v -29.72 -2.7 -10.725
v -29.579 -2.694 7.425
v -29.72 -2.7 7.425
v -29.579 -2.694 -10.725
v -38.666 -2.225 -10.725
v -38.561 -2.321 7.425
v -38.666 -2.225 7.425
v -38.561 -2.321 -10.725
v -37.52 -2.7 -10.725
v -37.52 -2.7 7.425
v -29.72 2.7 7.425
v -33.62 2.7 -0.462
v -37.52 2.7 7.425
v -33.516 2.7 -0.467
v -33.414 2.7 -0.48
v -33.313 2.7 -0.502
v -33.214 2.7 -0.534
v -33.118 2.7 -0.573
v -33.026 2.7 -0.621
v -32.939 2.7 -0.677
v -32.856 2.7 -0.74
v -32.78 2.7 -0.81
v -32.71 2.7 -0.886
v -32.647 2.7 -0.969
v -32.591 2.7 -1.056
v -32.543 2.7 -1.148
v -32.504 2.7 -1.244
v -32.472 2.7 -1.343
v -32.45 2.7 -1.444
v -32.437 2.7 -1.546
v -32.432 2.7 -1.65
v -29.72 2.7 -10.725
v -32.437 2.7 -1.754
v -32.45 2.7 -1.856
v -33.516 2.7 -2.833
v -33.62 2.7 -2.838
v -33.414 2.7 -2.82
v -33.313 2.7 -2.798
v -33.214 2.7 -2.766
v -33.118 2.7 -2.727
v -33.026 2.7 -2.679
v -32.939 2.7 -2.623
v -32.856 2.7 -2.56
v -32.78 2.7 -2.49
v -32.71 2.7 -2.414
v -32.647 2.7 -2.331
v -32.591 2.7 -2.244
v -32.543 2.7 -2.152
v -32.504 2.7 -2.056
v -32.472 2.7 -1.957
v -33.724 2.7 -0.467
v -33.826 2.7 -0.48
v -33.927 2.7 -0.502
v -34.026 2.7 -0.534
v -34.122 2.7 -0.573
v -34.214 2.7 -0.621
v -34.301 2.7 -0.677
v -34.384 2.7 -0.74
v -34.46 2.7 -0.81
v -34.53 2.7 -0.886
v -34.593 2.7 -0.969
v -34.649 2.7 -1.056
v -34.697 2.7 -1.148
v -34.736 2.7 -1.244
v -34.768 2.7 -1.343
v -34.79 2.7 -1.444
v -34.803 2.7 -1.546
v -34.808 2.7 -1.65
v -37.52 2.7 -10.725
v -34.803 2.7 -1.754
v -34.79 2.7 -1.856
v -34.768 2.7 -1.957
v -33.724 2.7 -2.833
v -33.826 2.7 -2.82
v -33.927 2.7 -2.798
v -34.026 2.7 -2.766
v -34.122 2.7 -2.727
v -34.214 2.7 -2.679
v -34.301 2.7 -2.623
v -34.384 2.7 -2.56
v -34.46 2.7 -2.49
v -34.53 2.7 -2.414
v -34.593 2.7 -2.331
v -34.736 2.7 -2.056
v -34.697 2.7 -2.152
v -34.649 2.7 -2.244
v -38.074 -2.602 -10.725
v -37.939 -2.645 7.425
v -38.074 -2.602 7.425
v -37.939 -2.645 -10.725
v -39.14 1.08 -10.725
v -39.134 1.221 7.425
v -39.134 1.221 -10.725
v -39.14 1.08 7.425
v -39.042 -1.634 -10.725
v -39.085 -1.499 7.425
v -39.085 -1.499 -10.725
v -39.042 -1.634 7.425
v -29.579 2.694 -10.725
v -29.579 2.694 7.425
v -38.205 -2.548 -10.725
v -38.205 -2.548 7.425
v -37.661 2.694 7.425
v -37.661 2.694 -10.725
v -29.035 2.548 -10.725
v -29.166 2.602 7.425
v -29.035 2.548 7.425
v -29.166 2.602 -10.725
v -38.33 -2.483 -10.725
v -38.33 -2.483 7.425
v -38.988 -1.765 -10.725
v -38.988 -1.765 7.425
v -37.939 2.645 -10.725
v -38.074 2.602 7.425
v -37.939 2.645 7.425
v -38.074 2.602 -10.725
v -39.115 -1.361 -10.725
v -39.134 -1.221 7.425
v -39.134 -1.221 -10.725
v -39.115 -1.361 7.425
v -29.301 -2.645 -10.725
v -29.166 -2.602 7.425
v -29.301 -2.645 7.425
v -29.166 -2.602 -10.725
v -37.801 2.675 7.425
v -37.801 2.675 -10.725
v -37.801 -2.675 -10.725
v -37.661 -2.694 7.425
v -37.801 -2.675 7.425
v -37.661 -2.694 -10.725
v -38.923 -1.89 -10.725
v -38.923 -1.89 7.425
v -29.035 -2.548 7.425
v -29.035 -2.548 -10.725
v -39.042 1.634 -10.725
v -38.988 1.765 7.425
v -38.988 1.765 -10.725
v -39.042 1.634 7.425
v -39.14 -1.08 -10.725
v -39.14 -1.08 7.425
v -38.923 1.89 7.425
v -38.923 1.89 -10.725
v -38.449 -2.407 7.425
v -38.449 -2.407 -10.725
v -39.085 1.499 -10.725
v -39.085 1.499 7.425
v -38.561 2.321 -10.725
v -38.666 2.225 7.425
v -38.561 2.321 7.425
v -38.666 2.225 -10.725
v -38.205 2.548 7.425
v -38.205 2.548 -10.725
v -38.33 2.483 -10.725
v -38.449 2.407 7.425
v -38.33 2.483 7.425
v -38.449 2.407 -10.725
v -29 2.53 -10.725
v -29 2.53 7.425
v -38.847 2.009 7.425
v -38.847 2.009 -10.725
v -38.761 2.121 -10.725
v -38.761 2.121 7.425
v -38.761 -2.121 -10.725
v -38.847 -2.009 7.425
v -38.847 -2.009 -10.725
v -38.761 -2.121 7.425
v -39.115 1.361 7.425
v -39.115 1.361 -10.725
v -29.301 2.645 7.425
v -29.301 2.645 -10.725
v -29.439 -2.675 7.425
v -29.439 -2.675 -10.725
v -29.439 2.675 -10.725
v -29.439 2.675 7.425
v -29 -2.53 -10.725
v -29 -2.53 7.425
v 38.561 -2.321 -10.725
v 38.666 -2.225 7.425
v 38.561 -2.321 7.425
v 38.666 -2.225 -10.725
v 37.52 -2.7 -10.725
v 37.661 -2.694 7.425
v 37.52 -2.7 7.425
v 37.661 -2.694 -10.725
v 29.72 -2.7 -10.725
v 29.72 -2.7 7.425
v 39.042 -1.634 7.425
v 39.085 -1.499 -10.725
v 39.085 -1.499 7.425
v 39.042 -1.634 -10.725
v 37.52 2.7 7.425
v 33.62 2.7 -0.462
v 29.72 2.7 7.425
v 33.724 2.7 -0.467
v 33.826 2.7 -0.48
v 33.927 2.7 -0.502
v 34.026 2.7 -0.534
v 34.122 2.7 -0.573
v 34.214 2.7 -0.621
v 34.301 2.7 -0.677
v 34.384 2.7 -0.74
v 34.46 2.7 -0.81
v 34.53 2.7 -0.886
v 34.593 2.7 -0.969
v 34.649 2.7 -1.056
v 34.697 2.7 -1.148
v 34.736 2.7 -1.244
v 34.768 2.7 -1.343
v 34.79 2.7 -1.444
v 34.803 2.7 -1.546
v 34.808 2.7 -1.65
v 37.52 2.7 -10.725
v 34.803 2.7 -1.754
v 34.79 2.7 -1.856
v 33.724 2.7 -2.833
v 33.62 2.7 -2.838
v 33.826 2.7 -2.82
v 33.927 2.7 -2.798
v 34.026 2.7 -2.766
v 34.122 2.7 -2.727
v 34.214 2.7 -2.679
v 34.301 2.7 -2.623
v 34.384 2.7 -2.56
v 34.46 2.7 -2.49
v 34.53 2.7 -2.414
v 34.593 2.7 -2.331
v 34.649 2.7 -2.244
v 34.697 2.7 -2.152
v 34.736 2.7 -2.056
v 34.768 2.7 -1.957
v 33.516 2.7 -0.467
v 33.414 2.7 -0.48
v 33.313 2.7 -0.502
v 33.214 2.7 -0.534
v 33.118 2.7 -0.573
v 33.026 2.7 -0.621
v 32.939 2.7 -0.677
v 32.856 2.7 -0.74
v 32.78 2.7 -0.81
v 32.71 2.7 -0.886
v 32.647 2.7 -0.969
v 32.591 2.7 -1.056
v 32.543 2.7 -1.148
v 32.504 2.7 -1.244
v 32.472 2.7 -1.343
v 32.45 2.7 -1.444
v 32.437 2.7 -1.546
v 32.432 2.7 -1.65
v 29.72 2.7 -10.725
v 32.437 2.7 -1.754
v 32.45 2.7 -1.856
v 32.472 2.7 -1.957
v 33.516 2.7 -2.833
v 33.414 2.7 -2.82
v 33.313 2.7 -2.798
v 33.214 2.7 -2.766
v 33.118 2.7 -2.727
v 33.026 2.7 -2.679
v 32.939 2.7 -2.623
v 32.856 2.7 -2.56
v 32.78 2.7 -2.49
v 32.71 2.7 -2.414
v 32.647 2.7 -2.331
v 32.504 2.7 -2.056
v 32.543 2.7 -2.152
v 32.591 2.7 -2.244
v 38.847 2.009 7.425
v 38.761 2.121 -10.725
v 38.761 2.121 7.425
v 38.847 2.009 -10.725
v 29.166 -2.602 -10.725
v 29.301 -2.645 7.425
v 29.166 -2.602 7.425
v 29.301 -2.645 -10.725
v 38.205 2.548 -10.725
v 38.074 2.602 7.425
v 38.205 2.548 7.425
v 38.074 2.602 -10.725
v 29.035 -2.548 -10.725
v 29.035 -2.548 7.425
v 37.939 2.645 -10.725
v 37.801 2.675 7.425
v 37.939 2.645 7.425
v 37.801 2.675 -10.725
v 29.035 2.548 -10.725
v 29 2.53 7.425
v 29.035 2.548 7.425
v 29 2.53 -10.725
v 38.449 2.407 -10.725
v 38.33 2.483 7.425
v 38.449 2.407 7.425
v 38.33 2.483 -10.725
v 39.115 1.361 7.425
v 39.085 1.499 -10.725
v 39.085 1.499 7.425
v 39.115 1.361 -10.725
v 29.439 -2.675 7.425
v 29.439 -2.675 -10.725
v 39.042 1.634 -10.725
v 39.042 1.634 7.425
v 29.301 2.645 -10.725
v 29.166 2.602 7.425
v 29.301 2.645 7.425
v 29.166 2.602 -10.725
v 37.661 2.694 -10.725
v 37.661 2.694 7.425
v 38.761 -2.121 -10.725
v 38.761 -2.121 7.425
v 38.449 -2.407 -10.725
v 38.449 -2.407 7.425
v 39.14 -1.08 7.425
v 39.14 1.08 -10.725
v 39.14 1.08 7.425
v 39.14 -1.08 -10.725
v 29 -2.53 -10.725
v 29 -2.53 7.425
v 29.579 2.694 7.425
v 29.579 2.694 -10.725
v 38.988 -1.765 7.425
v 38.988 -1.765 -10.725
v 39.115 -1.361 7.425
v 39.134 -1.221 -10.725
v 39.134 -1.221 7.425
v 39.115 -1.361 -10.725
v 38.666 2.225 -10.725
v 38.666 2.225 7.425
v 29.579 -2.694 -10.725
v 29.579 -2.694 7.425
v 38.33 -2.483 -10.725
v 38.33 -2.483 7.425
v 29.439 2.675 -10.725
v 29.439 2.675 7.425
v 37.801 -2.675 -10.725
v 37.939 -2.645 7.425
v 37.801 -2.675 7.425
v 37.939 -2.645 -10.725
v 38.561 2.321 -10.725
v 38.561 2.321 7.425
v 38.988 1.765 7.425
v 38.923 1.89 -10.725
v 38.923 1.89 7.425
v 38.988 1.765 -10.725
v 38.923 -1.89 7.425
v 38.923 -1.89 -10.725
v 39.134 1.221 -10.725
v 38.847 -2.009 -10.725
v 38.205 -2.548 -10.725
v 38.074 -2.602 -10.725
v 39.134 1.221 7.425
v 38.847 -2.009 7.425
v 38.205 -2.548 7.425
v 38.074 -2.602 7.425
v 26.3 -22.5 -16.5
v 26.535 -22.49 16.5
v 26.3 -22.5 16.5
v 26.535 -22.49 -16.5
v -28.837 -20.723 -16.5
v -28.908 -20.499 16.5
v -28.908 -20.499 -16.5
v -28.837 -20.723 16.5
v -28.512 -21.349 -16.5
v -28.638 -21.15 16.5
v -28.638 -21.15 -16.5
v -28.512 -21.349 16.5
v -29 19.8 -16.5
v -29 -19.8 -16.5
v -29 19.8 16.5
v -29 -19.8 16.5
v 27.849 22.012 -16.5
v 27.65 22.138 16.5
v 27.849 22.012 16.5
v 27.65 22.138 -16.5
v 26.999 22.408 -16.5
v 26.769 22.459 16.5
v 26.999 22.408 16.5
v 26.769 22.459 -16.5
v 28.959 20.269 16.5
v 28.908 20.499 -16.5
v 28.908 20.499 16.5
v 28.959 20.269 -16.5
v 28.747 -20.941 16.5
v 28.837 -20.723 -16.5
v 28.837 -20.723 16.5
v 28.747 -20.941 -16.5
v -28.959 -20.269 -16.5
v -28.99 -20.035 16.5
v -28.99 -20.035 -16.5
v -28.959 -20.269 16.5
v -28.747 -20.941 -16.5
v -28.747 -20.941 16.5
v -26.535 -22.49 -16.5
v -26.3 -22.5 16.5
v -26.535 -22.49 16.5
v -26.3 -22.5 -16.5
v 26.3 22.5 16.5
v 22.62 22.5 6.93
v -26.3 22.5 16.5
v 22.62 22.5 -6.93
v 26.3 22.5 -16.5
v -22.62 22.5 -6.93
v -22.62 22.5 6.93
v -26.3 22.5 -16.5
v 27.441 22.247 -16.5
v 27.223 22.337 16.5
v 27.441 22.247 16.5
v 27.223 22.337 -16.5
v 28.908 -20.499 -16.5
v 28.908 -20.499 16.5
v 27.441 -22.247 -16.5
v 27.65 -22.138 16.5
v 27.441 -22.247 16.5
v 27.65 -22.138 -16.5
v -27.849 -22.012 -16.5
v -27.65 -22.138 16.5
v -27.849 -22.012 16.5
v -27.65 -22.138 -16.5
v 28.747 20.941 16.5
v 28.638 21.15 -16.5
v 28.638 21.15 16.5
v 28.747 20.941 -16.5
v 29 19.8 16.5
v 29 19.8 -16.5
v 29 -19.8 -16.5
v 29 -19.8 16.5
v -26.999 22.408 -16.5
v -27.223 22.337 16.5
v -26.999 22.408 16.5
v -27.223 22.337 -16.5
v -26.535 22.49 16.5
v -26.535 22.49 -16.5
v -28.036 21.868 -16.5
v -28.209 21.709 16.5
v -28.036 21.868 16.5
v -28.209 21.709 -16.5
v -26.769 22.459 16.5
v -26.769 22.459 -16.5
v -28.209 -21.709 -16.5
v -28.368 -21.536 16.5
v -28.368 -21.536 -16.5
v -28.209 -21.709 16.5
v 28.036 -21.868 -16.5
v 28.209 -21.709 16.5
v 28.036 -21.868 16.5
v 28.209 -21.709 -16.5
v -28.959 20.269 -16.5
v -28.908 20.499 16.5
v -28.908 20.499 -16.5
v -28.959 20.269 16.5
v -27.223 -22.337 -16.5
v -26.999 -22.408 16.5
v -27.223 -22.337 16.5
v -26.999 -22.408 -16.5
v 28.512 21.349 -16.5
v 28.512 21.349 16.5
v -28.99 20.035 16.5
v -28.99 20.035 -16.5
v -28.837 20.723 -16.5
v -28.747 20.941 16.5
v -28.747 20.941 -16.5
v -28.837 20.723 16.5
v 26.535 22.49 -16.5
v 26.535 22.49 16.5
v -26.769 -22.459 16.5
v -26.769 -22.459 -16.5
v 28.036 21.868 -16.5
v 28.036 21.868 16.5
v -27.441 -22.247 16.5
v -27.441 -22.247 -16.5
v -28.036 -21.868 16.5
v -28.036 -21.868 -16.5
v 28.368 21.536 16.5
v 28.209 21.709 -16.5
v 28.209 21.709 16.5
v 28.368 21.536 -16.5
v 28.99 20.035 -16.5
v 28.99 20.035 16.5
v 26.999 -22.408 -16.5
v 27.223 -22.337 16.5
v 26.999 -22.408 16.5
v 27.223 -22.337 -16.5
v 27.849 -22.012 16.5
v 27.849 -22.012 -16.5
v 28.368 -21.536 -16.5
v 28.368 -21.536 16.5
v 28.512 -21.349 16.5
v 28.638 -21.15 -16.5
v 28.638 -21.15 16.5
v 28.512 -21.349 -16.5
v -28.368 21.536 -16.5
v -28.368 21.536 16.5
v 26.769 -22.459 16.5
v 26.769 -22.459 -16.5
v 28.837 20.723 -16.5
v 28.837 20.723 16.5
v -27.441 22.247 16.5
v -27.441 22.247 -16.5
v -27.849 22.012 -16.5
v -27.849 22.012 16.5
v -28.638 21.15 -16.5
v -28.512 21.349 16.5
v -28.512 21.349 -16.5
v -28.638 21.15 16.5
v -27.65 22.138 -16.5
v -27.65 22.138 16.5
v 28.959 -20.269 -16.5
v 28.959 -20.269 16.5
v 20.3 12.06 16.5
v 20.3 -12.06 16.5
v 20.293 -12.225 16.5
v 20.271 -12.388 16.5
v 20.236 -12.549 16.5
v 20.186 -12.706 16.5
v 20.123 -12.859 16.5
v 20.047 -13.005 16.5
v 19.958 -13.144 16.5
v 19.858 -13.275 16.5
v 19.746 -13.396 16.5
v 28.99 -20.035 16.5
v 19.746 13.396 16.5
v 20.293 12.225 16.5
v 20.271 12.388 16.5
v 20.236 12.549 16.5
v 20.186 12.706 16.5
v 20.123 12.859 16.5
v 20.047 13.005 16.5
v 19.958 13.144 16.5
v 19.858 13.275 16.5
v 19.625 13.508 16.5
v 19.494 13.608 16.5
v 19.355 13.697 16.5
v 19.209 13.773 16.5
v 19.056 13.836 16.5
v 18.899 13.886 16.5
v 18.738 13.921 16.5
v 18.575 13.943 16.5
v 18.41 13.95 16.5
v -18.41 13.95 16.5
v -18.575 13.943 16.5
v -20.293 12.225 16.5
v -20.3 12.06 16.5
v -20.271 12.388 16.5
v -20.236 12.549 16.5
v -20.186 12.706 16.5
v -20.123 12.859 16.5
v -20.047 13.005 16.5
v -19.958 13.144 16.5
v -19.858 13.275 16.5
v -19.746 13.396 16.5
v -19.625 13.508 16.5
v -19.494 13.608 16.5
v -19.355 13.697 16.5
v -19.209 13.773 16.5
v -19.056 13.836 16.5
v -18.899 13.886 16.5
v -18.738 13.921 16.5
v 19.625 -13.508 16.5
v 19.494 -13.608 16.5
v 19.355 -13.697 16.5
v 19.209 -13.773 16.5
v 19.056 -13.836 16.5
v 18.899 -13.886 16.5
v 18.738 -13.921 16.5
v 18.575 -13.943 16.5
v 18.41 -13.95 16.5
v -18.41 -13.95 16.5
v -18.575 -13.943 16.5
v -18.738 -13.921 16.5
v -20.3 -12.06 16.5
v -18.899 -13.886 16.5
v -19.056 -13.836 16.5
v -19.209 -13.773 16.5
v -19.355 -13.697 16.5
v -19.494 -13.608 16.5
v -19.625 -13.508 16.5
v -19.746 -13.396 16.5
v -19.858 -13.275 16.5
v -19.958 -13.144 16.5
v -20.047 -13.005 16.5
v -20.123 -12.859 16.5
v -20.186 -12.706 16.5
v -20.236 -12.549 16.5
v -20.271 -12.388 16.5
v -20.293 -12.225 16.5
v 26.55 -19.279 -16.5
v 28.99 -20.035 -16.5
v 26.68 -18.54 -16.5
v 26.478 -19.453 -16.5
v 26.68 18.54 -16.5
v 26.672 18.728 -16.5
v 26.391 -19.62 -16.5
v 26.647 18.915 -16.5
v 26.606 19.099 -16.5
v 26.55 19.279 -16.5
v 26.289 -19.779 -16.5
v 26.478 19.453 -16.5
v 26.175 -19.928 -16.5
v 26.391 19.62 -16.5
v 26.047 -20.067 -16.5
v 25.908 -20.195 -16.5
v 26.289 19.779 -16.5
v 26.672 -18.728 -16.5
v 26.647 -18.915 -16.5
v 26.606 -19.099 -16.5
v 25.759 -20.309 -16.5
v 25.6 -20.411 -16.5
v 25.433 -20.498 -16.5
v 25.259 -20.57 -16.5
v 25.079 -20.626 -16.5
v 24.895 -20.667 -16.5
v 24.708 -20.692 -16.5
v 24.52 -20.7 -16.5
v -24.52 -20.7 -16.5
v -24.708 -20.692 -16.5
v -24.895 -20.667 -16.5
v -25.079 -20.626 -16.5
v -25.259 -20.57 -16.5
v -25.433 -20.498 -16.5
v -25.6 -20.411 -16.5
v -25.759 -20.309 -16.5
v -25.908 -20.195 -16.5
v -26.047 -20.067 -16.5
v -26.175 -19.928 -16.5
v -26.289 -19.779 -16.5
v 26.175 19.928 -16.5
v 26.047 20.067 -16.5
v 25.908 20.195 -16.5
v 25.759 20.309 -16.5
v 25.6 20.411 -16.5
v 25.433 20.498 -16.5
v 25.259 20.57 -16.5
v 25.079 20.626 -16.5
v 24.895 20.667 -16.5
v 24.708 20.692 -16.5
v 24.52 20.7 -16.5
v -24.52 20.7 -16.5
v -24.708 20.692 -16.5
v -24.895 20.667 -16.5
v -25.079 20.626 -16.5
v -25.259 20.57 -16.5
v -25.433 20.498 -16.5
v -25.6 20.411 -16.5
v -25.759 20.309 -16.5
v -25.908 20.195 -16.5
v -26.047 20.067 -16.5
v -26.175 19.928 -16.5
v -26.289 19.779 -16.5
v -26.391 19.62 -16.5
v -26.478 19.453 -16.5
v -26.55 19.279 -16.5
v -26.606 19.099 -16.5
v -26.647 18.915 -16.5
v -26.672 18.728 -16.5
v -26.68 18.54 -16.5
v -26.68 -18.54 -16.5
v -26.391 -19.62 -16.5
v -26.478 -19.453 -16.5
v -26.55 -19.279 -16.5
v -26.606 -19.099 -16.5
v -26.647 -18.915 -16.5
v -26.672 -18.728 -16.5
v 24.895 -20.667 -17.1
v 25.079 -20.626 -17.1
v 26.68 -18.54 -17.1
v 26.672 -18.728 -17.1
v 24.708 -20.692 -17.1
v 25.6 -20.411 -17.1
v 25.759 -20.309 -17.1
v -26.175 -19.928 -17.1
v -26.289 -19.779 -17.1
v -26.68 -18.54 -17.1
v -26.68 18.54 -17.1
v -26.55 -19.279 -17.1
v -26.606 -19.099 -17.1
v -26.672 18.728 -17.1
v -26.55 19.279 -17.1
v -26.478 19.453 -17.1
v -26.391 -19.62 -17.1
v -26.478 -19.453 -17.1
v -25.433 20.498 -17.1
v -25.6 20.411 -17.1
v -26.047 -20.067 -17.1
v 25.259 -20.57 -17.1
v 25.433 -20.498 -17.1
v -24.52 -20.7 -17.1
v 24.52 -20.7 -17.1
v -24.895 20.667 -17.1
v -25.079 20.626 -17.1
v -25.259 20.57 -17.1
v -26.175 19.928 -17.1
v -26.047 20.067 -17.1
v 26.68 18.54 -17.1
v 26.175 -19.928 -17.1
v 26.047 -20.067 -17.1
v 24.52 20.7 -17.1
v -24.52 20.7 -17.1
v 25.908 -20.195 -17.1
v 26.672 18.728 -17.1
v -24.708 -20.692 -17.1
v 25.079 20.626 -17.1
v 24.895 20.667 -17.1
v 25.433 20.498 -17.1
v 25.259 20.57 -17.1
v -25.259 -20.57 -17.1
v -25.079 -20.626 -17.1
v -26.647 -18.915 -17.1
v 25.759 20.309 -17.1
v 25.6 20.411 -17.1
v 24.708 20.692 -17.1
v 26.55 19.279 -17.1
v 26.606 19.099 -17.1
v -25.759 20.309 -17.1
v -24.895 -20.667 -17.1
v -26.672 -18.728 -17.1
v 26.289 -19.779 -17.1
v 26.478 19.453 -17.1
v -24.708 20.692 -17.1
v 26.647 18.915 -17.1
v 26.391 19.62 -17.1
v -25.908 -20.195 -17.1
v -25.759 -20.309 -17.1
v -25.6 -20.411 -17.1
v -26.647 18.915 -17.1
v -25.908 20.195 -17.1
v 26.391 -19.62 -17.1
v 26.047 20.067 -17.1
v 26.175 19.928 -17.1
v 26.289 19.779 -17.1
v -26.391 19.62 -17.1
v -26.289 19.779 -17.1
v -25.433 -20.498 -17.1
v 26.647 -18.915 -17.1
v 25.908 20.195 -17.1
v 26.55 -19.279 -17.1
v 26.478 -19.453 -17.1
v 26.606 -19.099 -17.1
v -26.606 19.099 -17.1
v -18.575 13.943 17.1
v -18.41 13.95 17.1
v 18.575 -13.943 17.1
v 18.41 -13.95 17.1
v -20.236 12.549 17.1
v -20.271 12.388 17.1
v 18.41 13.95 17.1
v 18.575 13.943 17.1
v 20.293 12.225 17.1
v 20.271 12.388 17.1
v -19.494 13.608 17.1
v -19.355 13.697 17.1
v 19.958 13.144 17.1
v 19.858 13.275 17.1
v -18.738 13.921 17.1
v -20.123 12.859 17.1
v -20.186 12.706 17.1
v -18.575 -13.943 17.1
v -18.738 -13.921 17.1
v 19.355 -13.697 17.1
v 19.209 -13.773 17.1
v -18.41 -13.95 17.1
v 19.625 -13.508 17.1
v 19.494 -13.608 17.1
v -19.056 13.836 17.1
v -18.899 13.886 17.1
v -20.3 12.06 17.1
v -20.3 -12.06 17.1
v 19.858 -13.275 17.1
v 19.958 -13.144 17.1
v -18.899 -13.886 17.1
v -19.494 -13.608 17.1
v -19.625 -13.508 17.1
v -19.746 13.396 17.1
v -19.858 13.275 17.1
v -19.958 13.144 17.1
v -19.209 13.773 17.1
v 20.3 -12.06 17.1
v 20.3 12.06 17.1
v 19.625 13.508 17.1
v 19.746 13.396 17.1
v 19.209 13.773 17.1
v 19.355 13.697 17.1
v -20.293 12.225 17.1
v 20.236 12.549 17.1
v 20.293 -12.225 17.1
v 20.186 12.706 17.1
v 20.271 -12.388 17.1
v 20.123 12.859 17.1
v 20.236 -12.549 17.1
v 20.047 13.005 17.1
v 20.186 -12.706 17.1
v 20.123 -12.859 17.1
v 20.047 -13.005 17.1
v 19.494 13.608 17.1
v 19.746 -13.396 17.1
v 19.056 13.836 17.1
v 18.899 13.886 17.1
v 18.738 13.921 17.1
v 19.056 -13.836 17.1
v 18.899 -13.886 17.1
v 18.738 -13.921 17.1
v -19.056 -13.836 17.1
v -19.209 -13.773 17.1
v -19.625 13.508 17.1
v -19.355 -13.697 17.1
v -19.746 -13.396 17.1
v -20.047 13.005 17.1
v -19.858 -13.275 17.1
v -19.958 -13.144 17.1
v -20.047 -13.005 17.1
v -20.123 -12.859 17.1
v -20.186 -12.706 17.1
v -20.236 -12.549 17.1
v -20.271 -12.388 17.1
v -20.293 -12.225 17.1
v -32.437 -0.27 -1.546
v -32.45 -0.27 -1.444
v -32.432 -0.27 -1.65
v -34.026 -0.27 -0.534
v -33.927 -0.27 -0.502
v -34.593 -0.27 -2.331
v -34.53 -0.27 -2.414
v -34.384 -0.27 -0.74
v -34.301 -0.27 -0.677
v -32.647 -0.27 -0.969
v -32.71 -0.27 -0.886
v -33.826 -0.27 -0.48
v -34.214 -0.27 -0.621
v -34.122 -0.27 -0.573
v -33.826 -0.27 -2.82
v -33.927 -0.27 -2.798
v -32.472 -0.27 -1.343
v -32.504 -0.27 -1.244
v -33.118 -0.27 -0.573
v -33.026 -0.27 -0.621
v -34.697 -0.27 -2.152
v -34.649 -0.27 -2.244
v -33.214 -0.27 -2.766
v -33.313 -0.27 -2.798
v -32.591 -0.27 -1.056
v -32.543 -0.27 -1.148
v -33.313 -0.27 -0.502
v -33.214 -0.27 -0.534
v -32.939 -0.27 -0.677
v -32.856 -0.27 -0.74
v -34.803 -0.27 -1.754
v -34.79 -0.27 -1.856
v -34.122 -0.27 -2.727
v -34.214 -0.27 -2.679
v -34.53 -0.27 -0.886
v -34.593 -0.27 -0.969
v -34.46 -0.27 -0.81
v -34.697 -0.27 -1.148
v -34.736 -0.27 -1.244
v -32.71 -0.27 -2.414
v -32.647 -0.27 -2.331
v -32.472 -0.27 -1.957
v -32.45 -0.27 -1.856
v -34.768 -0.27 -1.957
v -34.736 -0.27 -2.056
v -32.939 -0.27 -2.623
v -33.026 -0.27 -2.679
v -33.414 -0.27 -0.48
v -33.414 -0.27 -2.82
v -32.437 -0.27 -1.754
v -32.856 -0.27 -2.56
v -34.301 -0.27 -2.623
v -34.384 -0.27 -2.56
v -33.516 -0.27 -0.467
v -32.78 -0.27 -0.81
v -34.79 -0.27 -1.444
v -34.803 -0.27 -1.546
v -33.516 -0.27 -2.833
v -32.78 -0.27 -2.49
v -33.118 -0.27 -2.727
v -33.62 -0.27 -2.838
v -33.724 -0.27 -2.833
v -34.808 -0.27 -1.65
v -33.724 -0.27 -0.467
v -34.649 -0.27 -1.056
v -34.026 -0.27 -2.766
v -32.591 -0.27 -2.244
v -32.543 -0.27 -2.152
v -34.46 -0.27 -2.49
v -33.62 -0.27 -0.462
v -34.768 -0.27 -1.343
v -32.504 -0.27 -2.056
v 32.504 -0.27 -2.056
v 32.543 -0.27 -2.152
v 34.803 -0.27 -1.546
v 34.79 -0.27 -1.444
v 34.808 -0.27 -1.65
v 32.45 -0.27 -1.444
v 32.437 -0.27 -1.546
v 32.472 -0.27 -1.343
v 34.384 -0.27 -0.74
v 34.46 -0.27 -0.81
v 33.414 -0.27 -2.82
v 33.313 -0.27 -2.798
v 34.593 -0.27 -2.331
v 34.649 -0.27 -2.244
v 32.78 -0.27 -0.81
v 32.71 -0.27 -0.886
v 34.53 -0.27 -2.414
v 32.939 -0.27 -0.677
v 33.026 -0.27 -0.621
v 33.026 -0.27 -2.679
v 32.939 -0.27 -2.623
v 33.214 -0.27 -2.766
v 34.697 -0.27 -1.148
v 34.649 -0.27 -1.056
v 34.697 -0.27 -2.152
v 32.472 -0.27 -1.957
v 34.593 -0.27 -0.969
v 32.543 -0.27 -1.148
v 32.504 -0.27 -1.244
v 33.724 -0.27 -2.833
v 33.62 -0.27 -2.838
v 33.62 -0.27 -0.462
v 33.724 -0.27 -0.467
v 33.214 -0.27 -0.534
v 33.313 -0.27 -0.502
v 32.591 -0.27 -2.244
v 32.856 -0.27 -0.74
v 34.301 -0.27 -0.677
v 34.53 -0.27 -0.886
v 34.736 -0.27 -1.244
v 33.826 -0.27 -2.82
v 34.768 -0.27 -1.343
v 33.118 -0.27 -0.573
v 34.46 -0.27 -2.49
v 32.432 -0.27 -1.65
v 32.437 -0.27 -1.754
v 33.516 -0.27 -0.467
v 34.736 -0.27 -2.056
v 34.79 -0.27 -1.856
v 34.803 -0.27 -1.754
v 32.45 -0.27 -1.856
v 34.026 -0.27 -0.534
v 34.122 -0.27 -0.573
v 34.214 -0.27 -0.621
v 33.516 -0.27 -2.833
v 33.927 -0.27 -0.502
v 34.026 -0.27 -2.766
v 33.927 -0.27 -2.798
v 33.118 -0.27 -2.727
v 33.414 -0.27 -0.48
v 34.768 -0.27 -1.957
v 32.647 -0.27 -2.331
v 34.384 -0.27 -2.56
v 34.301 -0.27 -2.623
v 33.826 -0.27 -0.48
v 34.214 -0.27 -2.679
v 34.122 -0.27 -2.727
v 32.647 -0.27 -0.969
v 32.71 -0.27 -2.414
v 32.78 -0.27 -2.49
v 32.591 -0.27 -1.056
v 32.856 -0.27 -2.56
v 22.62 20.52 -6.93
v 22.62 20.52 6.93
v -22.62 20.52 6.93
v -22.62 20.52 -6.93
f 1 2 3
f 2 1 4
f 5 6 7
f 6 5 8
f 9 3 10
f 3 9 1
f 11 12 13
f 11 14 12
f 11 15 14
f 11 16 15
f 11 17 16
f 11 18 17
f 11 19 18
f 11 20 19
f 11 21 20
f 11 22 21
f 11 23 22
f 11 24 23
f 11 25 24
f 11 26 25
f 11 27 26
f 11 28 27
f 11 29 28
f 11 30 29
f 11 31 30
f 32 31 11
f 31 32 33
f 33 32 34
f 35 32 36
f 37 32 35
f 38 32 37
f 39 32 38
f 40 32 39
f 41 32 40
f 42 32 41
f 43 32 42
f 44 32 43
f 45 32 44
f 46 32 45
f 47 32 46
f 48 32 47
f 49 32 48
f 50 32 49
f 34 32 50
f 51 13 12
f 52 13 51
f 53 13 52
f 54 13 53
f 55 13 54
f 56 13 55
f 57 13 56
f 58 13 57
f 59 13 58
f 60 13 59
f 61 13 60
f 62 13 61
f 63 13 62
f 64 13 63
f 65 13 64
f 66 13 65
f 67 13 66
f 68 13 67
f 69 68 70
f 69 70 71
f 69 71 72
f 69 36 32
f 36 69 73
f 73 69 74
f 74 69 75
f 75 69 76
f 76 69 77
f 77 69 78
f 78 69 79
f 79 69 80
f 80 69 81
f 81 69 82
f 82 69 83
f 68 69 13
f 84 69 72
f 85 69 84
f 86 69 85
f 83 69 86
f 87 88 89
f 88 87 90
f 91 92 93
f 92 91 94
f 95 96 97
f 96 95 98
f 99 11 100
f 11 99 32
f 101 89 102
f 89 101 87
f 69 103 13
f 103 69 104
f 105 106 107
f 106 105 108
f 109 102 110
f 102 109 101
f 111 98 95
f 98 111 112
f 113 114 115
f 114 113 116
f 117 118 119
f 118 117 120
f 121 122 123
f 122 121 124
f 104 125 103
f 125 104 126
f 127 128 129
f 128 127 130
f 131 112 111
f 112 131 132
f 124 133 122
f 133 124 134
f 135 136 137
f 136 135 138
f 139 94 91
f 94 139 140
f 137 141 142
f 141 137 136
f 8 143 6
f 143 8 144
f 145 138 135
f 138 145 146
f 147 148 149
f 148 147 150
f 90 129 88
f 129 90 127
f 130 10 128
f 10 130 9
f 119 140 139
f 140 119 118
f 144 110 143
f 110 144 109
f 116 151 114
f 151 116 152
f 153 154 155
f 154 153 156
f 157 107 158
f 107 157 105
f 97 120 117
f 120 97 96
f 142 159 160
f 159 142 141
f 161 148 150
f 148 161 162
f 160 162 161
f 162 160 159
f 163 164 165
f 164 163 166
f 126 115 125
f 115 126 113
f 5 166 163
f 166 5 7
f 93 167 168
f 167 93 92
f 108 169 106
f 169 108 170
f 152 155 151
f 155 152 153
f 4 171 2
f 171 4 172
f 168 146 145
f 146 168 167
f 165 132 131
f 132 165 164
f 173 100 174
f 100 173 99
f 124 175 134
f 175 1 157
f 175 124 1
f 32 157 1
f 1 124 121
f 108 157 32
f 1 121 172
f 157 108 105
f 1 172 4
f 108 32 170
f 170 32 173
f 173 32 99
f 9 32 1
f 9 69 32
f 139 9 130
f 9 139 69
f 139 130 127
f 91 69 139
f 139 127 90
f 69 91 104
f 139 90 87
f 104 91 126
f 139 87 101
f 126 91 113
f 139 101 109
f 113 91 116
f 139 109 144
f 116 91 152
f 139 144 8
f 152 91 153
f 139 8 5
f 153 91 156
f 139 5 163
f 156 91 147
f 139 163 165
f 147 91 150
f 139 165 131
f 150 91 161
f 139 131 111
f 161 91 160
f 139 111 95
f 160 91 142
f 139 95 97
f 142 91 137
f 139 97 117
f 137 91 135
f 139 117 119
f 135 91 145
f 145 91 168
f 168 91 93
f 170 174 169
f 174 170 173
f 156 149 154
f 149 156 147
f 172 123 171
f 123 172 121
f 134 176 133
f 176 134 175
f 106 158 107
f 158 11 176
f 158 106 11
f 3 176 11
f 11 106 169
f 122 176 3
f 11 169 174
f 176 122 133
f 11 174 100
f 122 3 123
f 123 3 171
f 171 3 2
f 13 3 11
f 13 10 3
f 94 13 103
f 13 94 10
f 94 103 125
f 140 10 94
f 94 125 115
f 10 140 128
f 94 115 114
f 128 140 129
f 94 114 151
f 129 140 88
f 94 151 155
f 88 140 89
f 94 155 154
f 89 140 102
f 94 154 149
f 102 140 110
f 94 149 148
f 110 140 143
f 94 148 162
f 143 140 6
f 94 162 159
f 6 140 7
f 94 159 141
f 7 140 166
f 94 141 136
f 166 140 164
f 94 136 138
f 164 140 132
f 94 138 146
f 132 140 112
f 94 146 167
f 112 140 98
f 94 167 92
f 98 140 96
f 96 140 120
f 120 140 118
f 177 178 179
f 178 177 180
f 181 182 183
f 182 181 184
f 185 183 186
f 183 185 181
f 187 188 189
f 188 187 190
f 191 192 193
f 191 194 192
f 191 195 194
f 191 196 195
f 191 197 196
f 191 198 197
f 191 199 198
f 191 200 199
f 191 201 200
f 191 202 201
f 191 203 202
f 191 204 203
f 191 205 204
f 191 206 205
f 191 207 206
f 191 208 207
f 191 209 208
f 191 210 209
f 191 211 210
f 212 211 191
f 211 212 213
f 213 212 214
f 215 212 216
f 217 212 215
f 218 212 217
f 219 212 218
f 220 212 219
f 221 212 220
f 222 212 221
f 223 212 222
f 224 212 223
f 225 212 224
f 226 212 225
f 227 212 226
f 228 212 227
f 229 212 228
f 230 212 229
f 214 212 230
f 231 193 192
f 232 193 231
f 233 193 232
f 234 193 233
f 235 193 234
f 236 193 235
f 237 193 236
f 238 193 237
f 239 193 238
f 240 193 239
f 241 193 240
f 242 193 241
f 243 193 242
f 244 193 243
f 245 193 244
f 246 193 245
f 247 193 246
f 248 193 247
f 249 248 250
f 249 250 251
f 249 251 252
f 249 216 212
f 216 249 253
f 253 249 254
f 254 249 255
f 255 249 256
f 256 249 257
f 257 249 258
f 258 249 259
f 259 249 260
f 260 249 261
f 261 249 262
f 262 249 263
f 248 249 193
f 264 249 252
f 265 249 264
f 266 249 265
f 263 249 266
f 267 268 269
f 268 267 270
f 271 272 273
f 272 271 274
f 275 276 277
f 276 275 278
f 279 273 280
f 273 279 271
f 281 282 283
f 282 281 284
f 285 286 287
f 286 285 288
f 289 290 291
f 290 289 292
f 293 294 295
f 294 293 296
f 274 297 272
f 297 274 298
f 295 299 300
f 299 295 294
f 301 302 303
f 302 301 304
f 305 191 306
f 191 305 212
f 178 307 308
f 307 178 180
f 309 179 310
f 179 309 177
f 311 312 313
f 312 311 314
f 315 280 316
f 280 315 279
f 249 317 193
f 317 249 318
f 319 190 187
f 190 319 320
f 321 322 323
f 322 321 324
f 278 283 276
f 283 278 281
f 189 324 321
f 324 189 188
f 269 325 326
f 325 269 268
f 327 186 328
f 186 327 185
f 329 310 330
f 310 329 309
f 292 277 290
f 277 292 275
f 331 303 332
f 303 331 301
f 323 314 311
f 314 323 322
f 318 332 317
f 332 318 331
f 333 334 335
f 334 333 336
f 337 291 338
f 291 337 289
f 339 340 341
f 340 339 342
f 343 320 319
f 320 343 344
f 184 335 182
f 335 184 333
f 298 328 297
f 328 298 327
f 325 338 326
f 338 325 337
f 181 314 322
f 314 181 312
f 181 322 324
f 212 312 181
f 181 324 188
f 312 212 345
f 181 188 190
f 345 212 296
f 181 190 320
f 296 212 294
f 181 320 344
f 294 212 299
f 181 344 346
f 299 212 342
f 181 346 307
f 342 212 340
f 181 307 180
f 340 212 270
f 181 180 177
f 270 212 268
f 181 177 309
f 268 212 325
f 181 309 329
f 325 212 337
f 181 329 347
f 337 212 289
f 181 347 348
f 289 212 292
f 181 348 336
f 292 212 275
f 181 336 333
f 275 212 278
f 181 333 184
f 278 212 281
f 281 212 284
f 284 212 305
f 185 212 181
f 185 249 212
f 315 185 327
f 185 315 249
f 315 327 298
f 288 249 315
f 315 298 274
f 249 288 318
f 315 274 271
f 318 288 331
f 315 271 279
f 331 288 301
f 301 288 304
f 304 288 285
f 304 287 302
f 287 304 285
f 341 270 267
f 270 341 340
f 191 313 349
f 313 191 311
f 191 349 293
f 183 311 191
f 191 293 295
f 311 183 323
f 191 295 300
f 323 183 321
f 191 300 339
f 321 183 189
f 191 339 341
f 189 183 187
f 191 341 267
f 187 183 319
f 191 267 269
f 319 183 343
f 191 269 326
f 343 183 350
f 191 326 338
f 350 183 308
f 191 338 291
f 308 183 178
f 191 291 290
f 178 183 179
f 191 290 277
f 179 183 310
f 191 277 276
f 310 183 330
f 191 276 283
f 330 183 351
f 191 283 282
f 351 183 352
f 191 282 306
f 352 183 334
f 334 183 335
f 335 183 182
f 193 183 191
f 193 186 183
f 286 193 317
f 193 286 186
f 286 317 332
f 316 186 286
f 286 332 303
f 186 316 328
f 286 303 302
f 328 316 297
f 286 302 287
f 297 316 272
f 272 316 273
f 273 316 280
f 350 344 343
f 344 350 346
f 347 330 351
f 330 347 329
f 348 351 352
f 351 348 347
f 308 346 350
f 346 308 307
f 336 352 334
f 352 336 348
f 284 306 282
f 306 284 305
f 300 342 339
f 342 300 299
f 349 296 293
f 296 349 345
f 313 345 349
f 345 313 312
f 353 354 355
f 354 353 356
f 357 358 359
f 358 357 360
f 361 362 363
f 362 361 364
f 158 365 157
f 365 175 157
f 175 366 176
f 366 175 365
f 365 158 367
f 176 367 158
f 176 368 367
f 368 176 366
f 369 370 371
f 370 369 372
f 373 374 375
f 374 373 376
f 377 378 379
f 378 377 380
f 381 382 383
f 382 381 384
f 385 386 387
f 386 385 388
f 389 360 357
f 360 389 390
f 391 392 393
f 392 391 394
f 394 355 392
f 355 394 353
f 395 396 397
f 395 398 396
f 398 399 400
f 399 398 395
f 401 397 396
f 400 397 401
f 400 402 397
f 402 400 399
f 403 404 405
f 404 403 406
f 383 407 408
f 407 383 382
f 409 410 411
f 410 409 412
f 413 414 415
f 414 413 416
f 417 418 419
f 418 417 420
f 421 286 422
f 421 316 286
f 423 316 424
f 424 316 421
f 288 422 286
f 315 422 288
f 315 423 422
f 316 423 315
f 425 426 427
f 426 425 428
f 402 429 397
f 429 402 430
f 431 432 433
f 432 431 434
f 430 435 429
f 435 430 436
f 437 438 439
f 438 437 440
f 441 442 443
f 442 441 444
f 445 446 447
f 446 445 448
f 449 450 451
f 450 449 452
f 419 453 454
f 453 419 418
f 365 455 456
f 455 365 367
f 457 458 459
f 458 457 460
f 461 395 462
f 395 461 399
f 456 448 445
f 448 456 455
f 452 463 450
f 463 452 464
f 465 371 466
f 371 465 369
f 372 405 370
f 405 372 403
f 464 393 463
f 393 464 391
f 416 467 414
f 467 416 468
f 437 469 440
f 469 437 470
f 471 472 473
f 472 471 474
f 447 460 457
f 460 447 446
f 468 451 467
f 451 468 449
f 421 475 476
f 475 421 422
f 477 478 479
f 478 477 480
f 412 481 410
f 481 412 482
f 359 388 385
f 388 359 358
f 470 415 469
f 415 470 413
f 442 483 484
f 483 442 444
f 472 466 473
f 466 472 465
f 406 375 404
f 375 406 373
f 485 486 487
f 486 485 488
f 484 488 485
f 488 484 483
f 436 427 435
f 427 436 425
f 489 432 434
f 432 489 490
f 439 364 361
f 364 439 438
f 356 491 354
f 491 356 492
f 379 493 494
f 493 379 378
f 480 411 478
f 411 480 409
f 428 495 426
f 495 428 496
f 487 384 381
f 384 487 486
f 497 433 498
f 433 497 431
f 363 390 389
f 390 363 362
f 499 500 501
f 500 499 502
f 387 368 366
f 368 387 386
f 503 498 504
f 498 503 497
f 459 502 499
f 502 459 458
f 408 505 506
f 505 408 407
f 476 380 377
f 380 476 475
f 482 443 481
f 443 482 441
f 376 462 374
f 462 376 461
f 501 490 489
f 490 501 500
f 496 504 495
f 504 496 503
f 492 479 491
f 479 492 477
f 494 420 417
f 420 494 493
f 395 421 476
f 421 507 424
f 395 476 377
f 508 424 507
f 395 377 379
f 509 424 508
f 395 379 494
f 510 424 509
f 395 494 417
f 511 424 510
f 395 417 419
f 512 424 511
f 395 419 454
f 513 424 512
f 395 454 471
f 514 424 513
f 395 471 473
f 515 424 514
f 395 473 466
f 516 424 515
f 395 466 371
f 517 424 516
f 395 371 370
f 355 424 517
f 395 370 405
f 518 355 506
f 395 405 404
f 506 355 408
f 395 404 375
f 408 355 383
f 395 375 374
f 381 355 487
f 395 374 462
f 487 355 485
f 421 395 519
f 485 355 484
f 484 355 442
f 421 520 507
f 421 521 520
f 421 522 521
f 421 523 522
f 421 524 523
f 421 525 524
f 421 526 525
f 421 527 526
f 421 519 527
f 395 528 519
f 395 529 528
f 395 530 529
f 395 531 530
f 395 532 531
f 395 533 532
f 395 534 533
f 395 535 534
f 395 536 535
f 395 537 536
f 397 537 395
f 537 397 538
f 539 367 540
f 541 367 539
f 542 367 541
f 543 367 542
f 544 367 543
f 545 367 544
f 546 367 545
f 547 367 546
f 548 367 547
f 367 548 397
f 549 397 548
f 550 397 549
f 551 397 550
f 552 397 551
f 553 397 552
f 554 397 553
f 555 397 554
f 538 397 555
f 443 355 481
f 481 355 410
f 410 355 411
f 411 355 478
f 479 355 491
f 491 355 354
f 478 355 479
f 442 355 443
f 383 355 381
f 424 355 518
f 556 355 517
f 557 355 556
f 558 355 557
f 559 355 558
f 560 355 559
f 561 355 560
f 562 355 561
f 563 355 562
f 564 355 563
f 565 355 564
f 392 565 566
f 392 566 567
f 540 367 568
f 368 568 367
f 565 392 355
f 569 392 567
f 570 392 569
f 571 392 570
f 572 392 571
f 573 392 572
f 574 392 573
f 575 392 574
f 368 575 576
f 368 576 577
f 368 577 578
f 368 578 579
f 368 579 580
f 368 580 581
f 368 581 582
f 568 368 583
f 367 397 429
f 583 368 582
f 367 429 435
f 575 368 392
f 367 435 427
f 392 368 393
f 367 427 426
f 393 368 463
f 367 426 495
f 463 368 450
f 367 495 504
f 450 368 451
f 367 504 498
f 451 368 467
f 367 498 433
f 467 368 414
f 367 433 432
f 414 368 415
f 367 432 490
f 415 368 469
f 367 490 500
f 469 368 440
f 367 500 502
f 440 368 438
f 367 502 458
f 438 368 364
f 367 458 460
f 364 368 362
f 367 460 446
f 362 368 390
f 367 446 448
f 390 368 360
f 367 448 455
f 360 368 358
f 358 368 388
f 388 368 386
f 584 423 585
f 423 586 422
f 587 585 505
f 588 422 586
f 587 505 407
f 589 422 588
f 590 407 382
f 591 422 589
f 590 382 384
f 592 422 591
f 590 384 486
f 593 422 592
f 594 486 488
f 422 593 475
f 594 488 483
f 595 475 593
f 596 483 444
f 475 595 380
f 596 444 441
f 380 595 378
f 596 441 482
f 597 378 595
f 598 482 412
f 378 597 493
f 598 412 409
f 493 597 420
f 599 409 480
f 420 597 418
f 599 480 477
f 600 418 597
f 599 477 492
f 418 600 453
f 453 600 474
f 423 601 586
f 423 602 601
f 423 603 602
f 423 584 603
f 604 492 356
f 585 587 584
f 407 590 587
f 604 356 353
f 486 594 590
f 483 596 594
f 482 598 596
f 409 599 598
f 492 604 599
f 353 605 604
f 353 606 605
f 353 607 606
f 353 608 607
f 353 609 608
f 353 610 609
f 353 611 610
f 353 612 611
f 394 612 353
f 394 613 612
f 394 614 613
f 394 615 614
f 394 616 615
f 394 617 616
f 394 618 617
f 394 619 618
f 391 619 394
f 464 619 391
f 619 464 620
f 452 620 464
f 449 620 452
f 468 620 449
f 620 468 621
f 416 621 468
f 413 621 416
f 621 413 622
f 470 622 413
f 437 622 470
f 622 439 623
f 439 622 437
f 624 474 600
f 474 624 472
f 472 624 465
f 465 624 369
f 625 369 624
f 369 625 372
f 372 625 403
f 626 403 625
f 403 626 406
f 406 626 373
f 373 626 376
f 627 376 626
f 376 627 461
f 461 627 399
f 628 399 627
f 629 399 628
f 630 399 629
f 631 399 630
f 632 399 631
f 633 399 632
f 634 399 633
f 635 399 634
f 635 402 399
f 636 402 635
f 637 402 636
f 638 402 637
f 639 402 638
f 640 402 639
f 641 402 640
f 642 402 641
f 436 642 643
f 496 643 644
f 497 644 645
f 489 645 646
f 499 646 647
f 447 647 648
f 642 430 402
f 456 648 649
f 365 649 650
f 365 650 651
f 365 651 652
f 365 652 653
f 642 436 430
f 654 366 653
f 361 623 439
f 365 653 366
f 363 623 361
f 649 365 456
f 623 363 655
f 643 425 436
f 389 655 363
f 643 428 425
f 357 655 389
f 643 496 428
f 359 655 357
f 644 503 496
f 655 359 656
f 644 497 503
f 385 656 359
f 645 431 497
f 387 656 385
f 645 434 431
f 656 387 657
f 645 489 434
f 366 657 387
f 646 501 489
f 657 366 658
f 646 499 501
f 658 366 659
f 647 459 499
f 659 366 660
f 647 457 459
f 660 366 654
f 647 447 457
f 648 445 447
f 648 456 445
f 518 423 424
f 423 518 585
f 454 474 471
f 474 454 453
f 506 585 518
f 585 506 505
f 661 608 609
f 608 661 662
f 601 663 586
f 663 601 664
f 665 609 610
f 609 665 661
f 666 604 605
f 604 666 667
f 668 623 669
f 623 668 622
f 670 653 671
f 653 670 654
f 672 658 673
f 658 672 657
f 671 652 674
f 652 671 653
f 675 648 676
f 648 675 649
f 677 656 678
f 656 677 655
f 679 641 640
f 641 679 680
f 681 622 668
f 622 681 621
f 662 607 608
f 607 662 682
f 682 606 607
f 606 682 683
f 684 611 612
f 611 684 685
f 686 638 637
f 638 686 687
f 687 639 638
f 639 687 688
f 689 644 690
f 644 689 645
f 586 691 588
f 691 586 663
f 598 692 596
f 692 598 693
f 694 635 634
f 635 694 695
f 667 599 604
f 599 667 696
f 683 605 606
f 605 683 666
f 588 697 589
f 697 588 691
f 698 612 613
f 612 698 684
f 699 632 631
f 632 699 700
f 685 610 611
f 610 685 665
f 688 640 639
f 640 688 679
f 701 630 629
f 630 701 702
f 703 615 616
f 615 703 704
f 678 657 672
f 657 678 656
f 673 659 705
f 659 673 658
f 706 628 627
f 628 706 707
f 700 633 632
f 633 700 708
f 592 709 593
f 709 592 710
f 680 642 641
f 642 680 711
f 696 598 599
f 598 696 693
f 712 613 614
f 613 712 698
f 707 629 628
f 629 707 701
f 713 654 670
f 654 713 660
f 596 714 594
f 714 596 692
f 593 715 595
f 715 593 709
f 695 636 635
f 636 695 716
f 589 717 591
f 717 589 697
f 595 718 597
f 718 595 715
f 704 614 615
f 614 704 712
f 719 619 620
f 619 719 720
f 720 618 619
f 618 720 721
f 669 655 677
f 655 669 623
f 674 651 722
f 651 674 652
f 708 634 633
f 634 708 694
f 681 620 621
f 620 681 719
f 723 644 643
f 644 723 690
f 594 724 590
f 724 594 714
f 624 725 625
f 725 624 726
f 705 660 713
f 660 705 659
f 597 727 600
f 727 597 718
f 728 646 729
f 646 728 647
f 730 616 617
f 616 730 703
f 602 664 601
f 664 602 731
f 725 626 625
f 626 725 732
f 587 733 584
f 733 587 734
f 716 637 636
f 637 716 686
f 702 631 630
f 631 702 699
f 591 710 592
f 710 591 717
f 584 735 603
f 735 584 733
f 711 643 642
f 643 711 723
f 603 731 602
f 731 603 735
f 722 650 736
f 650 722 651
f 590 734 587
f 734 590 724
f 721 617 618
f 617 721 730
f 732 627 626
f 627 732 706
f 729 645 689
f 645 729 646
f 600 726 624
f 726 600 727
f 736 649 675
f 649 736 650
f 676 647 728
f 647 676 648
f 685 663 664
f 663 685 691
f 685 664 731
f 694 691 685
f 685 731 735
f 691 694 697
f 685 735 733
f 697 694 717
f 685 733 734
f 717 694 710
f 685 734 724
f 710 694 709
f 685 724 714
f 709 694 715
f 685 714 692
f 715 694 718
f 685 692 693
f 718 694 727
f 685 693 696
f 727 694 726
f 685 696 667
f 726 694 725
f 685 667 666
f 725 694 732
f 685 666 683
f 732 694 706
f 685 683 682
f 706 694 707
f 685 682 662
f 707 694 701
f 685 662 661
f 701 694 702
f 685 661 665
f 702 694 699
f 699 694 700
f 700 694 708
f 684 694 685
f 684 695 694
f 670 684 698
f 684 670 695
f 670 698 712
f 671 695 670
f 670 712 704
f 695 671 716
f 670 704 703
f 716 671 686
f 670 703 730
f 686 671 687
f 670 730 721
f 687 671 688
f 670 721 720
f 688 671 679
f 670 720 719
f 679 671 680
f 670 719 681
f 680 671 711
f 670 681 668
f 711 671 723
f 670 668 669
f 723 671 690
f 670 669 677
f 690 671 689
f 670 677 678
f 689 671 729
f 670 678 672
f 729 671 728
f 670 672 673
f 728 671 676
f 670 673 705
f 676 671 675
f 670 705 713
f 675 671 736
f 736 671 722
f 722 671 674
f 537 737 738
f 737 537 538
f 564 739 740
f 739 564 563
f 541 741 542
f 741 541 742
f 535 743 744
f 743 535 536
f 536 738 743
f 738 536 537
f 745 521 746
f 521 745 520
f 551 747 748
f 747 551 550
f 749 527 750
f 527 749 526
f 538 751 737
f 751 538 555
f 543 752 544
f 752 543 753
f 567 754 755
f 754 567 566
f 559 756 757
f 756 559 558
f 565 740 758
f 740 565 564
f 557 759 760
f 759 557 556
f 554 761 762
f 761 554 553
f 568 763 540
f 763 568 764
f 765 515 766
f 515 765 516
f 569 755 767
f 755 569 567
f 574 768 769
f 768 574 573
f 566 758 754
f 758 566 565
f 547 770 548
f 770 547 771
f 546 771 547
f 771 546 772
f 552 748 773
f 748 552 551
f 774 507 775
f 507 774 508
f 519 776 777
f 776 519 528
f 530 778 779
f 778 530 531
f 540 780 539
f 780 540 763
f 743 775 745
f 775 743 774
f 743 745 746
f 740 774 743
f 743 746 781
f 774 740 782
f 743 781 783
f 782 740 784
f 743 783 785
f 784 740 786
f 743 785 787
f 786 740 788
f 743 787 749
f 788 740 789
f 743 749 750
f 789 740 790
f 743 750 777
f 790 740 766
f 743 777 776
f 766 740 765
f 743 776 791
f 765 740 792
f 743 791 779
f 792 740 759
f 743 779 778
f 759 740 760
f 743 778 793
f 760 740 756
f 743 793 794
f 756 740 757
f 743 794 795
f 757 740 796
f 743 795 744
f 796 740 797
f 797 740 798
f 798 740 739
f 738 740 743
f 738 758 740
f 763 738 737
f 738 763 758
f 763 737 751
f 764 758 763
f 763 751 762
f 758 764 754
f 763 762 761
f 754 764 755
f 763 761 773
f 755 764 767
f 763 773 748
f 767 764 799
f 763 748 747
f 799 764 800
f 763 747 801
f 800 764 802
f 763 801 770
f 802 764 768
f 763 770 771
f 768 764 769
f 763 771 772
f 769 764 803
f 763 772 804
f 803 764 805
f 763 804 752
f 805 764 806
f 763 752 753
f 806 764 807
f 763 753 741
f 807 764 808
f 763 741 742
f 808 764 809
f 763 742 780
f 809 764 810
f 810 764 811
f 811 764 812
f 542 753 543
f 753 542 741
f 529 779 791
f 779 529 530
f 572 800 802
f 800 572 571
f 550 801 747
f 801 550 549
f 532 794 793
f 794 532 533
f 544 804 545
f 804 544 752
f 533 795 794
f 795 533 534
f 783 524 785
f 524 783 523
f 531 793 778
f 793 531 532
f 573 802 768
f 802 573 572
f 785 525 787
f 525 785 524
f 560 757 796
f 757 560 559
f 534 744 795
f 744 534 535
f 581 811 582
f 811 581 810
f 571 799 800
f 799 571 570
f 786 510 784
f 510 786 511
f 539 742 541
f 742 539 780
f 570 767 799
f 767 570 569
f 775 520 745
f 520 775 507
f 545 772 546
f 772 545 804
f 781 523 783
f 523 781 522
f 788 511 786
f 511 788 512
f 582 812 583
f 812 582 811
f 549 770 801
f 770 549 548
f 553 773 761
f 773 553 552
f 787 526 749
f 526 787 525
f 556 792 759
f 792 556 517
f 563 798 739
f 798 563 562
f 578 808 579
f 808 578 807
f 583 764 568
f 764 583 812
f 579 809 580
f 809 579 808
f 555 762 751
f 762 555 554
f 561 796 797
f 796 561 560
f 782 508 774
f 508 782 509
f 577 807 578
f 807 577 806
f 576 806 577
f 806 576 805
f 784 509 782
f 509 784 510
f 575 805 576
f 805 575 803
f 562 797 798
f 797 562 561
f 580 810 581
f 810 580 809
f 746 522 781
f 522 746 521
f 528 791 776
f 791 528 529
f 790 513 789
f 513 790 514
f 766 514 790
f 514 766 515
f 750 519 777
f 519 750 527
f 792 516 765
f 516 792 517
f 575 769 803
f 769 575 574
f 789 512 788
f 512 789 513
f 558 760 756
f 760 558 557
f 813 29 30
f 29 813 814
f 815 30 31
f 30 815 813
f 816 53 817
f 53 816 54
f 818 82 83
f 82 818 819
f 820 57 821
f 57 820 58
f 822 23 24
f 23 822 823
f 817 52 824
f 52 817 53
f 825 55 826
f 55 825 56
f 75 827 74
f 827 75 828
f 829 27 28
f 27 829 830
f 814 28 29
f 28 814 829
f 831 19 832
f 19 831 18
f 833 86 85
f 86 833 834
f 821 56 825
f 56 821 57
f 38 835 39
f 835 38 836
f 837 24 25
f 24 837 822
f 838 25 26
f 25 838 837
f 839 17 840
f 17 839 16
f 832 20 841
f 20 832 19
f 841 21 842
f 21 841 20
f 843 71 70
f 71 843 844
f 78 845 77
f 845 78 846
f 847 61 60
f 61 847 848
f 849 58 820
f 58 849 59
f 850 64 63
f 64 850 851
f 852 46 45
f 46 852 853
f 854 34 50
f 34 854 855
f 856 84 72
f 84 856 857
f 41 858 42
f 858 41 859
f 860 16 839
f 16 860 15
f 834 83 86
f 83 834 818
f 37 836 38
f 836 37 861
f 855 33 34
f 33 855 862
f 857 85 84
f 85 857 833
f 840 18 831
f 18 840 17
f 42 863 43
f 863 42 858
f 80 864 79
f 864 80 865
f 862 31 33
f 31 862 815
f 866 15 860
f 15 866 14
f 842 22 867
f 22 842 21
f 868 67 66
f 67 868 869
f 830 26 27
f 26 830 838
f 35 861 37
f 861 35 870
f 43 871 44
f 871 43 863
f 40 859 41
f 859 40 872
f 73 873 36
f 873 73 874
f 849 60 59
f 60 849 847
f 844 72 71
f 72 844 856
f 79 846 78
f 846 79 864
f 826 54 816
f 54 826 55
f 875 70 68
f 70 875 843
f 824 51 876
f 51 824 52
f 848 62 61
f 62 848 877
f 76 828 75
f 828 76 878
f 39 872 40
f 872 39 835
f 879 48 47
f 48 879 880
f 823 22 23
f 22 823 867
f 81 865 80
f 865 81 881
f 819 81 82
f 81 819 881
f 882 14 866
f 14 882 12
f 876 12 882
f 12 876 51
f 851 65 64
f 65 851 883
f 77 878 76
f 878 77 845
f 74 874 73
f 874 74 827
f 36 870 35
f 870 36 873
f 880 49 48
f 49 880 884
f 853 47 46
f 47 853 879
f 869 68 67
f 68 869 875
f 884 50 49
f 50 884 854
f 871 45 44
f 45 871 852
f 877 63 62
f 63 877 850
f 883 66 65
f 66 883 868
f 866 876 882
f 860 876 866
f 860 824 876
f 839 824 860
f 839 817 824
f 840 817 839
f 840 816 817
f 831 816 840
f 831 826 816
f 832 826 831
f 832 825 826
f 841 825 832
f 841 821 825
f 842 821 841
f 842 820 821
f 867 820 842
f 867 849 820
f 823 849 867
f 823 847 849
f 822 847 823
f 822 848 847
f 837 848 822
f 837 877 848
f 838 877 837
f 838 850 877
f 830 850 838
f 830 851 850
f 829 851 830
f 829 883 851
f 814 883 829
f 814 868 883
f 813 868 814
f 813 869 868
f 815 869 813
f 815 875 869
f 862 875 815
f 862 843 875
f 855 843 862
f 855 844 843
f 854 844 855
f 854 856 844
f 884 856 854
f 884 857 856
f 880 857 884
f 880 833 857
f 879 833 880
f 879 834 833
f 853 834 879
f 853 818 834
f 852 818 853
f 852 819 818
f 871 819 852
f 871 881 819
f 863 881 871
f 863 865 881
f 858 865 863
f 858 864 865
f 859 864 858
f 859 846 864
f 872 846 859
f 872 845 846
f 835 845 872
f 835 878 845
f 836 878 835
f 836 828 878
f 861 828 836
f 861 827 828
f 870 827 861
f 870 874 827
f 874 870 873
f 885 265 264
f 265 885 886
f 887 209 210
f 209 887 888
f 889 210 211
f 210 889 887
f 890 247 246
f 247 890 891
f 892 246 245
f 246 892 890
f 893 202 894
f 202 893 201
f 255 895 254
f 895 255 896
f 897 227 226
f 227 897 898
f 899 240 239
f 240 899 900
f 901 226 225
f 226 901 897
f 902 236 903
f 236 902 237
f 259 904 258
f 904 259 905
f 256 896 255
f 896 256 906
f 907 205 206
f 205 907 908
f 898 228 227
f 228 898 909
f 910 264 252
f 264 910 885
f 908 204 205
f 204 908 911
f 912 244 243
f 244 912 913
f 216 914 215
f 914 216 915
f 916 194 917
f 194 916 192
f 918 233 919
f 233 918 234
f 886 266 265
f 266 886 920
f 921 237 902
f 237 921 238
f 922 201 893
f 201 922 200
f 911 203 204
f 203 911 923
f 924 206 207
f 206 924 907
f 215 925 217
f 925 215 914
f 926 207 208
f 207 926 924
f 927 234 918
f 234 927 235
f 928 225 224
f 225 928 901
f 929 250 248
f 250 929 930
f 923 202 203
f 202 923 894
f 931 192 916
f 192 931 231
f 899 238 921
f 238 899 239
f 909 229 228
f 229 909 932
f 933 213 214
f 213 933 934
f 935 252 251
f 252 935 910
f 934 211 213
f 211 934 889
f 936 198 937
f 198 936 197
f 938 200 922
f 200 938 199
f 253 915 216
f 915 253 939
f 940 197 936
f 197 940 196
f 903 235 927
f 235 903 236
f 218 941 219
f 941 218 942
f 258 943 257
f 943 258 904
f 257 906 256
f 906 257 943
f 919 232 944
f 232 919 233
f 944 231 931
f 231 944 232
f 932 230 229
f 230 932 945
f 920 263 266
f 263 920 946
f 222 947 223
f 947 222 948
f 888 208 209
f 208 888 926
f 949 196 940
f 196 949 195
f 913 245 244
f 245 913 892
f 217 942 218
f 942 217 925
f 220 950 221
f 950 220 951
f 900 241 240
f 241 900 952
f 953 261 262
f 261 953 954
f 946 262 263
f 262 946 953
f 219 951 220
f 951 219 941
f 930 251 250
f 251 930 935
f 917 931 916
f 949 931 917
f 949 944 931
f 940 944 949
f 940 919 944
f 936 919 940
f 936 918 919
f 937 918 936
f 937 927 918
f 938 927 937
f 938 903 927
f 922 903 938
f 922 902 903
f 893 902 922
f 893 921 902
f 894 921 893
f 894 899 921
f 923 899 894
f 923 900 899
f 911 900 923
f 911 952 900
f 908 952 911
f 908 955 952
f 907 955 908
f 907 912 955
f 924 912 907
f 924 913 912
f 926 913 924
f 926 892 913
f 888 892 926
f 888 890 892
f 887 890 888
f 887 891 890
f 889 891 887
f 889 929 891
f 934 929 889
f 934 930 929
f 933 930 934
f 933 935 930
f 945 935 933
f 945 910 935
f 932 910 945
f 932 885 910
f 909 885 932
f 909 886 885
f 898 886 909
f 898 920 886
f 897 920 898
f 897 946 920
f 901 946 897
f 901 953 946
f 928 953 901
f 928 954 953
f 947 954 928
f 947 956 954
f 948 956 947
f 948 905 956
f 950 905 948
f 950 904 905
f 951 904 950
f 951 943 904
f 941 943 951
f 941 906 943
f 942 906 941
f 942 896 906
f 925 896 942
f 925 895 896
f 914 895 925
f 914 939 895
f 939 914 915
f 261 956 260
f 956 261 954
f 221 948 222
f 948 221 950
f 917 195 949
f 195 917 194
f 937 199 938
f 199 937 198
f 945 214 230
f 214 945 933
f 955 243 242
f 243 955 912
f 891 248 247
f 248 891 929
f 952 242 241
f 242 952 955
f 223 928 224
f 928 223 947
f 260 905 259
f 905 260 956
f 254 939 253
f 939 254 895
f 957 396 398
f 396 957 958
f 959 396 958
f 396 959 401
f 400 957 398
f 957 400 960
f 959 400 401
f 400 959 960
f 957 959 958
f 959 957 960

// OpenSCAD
// Solid State Relay (SSR) module - one connected solid
// Overall size: 58.0mm x 45.0mm x 33.0mm (X x Y x Z)

length_mm = 58.0;
width_mm  = 45.0;
height_mm = 33.0;

$fn = 72;

// Rounded box helper (works with r=0 too)
module rounded_box(size=[10,10,10], r=0, center=true) {
    l = size[0]; w = size[1]; h = size[2];
    rr = max(0, min(r, min(l,w)/2 - 0.01));
    if (rr <= 0) {
        cube([l,w,h], center=center);
    } else {
        // 2D offset then extrude
        translate(center ? [0,0,0] : [l/2,w/2,h/2])
            linear_extrude(height=h, center=true)
                offset(r=rr)
                    square([l-2*rr, w-2*rr], center=true);
    }
}

module ssr_module() {
    // Base body (kept exact overall dimensions)
    body_l = length_mm;
    body_w = width_mm;
    body_h = height_mm;

    // Feature sizing (all derived from overall dimensions)
    corner_r = min(body_l, body_w) * 0.06;          // subtle rounding
    overlap  = 0.6;                                  // ensures watertight unions

    // Top terminal block (raised area)
    top_h = body_h * 0.22;                           // ~7.26mm
    top_l = body_l * 0.70;
    top_w = body_w * 0.62;

    // Side mounting ears (common SSR look)
    ear_t = body_w * 0.12;                           // thickness in Y
    ear_l = body_l * 0.18;                           // extension in X
    ear_h = body_h * 0.55;                           // height in Z

    // Bottom base flange (slight step)
    flange_h = body_h * 0.10;
    flange_l = body_l * 0.92;
    flange_w = body_w * 0.92;

    // Front face shallow recess (label plate area) - recessed, not text
    recess_d = body_h * 0.06;                        // depth into body (Z direction from front face)
    recess_l = body_l * 0.78;
    recess_h = body_h * 0.42;

    // Terminal posts (simple blocks) on top
    post_h = top_h * 0.70;
    post_w = top_w * 0.18;
    post_l = top_l * 0.22;
    post_gap = top_l * 0.08;

    // Place "front" as +Y face for recess
    difference() {
        union() {
            // Main body
            rounded_box([body_l, body_w, body_h], r=corner_r, center=true);

            // Bottom flange: sits on bottom face, overlaps into body
            translate([0, 0, -body_h/2 + flange_h/2 - overlap/2])
                rounded_box([flange_l, flange_w, flange_h + overlap], r=corner_r*0.8, center=true);

            // Top terminal block: sits on top face, overlaps into body
            translate([0, 0, body_h/2 - top_h/2 + overlap/2])
                rounded_box([top_l, top_w, top_h + overlap], r=corner_r*0.7, center=true);

            // Two side mounting ears (left/right in X), centered in Y, mid-height
            for (sx = [-1, 1]) {
                translate([sx*(body_l/2 + ear_l/2 - overlap), 0, -body_h*0.05])
                    rounded_box([ear_l + overlap, ear_t, ear_h], r=corner_r*0.6, center=true);
            }

            // Terminal posts on top block (4 posts)
            z_posts = body_h/2 - top_h + post_h/2 + overlap/2; // within top block, connected
            x0 = -( (2*post_l + post_gap) / 2 );
            for (i = [0:3]) {
                xi = x0 + (i%2)*(post_l + post_gap);
                yi = (i<2 ? -1 : 1) * (top_w*0.22);
                translate([xi, yi, z_posts])
                    rounded_box([post_l, post_w, post_h + overlap], r=corner_r*0.25, center=true);
            }
        }

        // Front face recess (shallow pocket) - subtract from +Y face
        // Positioned so it cuts into the body but does not break through.
        translate([0, body_w/2 - recess_d/2 + 0.01, 0])
            cube([recess_l, recess_d + 0.02, recess_h], center=true);

        // Indications of mounting holes on ears (shallow dimples, not through-holes)
        // Subtracted from outer faces of ears to suggest holes while keeping one solid.
        dimple_r = min(ear_t, ear_h) * 0.22;
        dimple_d = ear_t * 0.55; // depth into ear from its outer Y face
        for (sx = [-1, 1]) {
            // Outer Y face of ear is at +/- ear_t/2 relative to ear center (ear centered at Y=0)
            // We dimple from +Y side only to keep consistent "front" direction.
            translate([sx*(body_l/2 + ear_l/2 - overlap), ear_t/2 - dimple_d/2 + 0.01, -body_h*0.05])
                rotate([90,0,0])
                    cylinder(h=dimple_d + 0.02, r=dimple_r, center=true);
        }
    }
}

ssr_module();
